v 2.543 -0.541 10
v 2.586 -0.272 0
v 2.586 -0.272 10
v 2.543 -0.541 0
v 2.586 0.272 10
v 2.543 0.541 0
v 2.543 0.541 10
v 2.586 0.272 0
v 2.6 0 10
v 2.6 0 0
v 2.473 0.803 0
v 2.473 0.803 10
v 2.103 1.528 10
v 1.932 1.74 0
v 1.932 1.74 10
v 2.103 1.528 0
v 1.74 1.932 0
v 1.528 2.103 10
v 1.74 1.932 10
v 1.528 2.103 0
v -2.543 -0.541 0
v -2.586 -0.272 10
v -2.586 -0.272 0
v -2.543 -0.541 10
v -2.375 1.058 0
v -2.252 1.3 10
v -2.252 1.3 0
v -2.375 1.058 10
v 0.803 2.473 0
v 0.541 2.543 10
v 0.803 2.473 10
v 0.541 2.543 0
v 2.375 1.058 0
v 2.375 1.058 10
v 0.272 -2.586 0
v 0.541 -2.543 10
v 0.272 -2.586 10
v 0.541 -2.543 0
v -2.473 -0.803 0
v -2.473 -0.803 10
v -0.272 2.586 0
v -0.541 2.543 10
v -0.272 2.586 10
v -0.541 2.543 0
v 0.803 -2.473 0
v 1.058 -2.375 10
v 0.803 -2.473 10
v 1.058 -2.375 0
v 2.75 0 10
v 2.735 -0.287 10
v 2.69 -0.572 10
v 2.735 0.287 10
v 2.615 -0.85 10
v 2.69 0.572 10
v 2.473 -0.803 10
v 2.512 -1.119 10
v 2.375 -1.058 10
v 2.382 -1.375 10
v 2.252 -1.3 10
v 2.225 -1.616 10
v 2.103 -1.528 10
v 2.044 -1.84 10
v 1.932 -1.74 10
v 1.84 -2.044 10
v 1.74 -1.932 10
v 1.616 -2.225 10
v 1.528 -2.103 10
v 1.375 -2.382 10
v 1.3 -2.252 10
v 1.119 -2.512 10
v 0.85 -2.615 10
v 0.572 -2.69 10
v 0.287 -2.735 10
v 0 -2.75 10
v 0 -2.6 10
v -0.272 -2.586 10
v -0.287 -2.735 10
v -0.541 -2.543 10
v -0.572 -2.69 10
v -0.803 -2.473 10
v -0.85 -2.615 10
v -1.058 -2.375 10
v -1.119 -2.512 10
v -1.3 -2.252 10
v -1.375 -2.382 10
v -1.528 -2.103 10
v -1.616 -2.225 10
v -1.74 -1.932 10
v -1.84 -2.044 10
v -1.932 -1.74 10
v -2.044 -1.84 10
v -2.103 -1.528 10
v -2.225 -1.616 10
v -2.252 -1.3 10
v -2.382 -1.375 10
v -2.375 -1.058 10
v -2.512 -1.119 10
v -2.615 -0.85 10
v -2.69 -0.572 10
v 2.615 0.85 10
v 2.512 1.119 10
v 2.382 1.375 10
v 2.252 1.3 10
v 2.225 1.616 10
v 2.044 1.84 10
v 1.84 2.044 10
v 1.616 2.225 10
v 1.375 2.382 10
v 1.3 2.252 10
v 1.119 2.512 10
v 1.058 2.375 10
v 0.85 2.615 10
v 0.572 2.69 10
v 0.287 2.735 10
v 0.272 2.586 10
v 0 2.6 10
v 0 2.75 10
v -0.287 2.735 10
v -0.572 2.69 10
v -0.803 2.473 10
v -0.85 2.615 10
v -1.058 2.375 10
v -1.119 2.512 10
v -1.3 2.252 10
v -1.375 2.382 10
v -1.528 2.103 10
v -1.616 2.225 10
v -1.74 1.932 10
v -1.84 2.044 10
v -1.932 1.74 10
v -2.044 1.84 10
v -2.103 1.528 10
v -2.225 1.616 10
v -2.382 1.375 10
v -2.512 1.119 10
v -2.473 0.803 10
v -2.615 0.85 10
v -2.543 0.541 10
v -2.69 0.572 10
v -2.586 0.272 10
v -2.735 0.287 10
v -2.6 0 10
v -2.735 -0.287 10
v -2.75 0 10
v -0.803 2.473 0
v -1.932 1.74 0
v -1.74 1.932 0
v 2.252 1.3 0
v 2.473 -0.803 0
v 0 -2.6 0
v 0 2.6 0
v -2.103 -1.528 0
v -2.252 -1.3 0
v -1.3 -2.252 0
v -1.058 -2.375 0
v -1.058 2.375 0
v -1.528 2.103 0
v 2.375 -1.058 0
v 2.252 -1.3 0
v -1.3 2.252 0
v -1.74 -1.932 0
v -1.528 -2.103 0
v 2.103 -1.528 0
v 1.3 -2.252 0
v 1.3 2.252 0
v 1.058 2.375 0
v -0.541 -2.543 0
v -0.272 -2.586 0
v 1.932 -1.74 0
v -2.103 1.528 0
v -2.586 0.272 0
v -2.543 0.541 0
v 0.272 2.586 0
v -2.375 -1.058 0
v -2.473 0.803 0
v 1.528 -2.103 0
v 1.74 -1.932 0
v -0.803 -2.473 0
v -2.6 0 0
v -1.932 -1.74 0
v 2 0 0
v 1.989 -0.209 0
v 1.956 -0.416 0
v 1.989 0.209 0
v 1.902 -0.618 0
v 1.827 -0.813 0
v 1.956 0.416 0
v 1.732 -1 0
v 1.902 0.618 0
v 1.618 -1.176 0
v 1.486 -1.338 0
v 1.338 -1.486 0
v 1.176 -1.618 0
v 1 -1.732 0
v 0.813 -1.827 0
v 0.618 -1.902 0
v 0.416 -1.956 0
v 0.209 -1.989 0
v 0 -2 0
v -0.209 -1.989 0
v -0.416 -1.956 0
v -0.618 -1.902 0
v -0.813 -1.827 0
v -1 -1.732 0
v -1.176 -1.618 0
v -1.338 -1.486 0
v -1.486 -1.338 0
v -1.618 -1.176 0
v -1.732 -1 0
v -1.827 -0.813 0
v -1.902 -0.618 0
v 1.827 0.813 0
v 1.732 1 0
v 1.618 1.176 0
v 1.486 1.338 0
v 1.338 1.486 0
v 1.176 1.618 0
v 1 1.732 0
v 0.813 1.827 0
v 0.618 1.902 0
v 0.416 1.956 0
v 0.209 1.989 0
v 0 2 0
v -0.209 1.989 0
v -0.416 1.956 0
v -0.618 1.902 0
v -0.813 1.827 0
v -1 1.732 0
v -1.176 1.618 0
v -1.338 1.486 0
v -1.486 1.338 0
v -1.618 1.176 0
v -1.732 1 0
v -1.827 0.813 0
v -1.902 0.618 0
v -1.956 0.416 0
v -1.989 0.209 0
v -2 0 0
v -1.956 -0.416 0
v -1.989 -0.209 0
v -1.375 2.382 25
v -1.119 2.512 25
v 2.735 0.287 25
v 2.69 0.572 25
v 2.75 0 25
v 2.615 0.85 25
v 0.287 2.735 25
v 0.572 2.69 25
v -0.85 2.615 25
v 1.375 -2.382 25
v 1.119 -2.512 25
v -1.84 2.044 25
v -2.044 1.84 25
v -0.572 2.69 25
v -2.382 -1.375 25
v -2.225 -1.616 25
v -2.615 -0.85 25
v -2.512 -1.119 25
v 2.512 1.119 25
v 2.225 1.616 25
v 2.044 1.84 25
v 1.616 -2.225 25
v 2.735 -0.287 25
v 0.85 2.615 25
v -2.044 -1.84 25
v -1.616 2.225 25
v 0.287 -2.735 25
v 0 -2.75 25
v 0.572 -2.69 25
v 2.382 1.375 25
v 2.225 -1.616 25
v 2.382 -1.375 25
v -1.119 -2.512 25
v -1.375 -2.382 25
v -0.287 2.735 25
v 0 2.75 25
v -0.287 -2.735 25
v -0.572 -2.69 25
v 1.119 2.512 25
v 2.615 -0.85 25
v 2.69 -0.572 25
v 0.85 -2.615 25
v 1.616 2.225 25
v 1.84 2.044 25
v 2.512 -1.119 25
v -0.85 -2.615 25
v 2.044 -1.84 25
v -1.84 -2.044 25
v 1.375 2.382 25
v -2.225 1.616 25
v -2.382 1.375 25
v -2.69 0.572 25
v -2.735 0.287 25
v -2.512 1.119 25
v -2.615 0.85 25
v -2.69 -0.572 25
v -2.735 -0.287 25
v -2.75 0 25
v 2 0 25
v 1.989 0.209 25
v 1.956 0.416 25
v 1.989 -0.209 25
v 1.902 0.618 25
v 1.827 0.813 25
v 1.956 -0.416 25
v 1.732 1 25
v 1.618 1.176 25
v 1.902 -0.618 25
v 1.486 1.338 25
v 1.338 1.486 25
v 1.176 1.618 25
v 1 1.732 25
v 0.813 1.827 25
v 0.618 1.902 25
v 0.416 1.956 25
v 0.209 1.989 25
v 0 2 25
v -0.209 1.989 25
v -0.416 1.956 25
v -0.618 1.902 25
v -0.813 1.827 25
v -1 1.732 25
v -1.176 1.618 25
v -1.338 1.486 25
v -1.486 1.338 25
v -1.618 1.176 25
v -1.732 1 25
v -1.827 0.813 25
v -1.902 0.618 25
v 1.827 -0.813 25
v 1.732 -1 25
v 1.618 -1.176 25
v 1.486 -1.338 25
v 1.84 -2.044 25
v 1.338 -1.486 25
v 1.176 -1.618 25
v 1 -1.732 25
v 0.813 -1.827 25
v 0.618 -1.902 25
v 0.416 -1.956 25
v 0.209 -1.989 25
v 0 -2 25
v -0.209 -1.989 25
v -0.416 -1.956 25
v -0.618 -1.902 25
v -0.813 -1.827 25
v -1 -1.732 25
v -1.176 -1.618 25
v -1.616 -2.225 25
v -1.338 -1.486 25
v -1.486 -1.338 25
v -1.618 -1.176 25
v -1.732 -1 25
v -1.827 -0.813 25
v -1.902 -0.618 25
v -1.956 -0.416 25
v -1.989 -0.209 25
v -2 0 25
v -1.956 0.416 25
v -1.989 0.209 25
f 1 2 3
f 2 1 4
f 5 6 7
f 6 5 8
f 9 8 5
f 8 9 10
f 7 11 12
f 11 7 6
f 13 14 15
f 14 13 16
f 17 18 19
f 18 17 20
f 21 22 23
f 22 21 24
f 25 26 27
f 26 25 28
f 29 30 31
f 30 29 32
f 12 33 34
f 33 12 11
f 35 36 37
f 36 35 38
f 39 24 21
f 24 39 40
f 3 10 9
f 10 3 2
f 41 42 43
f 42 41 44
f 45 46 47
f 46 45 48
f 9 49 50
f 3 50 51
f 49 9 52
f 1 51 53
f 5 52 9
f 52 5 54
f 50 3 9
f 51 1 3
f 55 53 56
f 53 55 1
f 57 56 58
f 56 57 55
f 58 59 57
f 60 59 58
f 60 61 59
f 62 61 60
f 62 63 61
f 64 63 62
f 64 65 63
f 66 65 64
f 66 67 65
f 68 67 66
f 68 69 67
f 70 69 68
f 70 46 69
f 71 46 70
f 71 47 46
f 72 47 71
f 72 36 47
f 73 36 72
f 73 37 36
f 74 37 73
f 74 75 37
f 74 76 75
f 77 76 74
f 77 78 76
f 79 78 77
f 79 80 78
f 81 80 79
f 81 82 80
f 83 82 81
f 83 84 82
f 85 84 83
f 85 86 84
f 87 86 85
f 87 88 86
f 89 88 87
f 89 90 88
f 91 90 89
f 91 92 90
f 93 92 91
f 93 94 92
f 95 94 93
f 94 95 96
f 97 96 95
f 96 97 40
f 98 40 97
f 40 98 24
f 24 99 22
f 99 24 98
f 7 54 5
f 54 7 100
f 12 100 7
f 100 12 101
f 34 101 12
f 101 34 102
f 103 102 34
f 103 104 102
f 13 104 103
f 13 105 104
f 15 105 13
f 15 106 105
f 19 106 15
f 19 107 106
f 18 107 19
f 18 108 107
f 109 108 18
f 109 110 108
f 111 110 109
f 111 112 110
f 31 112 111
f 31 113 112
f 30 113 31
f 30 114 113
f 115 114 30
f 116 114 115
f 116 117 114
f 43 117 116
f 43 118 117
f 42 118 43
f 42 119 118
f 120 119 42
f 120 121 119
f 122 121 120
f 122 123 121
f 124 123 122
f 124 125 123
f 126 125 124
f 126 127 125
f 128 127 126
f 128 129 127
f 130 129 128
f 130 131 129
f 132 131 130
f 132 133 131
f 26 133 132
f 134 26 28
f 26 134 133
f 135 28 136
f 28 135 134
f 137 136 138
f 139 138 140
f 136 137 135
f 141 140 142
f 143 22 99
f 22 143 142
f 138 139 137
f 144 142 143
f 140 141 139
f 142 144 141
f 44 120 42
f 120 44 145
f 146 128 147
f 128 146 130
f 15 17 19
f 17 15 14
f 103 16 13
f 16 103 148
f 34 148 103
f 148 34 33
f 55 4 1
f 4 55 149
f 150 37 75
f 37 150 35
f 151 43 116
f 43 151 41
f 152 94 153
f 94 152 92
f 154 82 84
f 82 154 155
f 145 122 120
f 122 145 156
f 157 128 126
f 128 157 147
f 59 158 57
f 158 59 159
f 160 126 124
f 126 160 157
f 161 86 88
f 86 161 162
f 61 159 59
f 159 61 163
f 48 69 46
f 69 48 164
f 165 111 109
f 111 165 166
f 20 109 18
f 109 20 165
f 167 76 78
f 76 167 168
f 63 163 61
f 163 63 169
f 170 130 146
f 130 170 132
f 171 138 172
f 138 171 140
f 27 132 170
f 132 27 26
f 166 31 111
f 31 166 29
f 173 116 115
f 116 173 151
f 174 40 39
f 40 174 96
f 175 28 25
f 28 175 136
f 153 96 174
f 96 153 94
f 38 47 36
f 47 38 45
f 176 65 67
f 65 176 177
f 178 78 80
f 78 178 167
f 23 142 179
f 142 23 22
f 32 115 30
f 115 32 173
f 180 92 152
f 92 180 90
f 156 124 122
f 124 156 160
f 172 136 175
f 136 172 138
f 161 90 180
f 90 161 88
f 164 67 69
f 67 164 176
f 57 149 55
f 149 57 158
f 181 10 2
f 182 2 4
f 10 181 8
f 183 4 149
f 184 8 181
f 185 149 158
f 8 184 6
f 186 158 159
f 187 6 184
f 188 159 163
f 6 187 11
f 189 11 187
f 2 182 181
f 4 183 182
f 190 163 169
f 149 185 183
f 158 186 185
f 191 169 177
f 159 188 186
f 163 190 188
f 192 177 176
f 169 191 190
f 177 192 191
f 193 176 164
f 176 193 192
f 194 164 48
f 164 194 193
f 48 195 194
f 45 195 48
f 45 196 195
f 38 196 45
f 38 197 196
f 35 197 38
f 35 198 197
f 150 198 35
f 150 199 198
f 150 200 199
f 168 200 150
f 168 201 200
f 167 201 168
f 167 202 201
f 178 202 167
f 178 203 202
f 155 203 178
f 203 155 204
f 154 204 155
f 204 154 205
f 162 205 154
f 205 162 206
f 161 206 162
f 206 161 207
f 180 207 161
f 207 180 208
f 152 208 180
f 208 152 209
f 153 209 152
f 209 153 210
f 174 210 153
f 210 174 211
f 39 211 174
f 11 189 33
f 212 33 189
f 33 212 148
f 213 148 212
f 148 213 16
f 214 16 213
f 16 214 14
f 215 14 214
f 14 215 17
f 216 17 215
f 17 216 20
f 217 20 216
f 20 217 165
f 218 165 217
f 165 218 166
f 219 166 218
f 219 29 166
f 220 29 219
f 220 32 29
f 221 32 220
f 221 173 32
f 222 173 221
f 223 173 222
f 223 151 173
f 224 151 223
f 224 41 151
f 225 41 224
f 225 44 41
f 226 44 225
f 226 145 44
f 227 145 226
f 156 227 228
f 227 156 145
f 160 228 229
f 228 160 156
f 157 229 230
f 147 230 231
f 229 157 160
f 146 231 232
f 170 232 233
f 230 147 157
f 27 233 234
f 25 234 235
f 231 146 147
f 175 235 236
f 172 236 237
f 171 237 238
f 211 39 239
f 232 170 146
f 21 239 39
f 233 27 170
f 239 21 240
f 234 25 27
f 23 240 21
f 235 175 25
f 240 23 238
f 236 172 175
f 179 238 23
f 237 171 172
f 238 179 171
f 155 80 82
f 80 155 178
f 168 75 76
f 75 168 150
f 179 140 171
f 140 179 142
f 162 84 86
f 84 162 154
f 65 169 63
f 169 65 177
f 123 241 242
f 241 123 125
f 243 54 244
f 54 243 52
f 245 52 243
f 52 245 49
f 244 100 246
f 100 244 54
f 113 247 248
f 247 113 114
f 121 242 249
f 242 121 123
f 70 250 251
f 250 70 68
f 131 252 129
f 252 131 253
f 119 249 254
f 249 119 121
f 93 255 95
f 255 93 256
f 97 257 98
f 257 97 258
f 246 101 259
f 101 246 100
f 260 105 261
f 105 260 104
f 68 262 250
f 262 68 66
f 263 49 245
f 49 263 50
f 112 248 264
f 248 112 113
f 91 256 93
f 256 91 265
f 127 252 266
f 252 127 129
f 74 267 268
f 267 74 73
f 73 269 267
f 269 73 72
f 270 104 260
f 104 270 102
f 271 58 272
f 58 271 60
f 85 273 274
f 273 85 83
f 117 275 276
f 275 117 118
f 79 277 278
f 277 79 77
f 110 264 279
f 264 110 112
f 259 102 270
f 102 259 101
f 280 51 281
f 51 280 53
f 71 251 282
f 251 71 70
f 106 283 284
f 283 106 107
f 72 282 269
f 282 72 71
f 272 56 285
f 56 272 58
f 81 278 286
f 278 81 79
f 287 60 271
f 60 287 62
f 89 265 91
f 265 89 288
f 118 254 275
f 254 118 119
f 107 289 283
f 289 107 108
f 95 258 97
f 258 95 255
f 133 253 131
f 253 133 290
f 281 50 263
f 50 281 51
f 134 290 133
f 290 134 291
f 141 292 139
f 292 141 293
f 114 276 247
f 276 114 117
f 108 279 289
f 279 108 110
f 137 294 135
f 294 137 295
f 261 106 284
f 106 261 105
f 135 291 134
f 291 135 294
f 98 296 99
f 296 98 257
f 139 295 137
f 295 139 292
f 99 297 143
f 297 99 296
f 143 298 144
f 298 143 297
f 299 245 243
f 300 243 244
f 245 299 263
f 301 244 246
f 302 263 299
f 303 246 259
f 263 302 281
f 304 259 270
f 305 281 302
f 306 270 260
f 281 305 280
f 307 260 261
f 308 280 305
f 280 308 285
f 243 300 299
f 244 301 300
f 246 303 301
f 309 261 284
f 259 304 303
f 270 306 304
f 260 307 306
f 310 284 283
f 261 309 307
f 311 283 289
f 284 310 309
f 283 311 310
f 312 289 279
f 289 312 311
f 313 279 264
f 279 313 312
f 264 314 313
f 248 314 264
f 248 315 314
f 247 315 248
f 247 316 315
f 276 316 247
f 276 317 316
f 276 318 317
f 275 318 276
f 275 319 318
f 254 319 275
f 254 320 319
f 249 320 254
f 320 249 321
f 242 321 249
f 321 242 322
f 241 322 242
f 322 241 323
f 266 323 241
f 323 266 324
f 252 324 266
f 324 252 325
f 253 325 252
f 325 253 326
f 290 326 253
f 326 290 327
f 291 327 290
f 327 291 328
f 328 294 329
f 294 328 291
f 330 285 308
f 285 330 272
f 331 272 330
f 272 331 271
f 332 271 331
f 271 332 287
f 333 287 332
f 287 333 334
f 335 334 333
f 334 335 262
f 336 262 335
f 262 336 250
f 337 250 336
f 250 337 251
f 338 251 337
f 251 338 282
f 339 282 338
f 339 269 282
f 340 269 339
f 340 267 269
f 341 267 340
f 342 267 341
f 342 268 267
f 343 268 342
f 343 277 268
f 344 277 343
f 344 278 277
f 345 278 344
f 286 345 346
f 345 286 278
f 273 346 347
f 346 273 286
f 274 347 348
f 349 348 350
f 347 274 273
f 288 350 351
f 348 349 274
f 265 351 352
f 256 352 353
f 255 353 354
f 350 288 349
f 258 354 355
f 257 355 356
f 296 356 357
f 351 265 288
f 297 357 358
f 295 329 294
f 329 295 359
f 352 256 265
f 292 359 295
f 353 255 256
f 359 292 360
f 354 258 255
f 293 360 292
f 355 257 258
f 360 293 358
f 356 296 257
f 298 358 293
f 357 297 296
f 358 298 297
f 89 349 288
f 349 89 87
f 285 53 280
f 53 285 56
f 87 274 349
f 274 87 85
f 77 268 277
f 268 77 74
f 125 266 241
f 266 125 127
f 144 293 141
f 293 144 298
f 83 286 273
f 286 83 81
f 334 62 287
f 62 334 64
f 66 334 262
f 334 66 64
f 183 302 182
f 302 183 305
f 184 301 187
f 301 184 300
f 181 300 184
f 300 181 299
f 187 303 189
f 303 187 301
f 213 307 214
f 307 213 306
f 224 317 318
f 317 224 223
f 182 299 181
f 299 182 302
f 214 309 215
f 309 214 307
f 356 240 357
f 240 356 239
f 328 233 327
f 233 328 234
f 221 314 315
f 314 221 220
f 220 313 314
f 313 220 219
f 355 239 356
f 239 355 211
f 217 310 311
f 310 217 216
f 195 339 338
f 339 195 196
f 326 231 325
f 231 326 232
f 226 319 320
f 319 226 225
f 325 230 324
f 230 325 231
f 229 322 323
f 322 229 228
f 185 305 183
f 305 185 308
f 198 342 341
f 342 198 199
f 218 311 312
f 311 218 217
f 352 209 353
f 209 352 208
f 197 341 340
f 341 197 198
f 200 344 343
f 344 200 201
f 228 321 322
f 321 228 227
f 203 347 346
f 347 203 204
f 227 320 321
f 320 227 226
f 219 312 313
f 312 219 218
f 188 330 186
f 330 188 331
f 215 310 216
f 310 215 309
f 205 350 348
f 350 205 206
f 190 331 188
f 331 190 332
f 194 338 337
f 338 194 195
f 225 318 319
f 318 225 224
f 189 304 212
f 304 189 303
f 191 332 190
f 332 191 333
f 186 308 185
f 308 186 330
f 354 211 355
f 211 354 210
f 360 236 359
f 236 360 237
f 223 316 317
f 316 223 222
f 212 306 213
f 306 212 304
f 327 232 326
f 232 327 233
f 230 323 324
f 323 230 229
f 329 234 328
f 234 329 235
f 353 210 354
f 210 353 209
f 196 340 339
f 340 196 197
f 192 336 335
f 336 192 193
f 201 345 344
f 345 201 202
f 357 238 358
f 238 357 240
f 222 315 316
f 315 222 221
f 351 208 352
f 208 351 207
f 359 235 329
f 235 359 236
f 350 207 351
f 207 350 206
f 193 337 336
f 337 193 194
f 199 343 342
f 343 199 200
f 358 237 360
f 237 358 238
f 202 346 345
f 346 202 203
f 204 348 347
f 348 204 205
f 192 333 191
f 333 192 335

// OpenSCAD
$fn=60;

difference(){
union(){
cylinder(h = 10, d = 5.2);
translate([0,0,10])
cylinder(h = 15, d = 5.5);
}
translate([0,0,-1])
cylinder(h = 50, d = 4);
}
